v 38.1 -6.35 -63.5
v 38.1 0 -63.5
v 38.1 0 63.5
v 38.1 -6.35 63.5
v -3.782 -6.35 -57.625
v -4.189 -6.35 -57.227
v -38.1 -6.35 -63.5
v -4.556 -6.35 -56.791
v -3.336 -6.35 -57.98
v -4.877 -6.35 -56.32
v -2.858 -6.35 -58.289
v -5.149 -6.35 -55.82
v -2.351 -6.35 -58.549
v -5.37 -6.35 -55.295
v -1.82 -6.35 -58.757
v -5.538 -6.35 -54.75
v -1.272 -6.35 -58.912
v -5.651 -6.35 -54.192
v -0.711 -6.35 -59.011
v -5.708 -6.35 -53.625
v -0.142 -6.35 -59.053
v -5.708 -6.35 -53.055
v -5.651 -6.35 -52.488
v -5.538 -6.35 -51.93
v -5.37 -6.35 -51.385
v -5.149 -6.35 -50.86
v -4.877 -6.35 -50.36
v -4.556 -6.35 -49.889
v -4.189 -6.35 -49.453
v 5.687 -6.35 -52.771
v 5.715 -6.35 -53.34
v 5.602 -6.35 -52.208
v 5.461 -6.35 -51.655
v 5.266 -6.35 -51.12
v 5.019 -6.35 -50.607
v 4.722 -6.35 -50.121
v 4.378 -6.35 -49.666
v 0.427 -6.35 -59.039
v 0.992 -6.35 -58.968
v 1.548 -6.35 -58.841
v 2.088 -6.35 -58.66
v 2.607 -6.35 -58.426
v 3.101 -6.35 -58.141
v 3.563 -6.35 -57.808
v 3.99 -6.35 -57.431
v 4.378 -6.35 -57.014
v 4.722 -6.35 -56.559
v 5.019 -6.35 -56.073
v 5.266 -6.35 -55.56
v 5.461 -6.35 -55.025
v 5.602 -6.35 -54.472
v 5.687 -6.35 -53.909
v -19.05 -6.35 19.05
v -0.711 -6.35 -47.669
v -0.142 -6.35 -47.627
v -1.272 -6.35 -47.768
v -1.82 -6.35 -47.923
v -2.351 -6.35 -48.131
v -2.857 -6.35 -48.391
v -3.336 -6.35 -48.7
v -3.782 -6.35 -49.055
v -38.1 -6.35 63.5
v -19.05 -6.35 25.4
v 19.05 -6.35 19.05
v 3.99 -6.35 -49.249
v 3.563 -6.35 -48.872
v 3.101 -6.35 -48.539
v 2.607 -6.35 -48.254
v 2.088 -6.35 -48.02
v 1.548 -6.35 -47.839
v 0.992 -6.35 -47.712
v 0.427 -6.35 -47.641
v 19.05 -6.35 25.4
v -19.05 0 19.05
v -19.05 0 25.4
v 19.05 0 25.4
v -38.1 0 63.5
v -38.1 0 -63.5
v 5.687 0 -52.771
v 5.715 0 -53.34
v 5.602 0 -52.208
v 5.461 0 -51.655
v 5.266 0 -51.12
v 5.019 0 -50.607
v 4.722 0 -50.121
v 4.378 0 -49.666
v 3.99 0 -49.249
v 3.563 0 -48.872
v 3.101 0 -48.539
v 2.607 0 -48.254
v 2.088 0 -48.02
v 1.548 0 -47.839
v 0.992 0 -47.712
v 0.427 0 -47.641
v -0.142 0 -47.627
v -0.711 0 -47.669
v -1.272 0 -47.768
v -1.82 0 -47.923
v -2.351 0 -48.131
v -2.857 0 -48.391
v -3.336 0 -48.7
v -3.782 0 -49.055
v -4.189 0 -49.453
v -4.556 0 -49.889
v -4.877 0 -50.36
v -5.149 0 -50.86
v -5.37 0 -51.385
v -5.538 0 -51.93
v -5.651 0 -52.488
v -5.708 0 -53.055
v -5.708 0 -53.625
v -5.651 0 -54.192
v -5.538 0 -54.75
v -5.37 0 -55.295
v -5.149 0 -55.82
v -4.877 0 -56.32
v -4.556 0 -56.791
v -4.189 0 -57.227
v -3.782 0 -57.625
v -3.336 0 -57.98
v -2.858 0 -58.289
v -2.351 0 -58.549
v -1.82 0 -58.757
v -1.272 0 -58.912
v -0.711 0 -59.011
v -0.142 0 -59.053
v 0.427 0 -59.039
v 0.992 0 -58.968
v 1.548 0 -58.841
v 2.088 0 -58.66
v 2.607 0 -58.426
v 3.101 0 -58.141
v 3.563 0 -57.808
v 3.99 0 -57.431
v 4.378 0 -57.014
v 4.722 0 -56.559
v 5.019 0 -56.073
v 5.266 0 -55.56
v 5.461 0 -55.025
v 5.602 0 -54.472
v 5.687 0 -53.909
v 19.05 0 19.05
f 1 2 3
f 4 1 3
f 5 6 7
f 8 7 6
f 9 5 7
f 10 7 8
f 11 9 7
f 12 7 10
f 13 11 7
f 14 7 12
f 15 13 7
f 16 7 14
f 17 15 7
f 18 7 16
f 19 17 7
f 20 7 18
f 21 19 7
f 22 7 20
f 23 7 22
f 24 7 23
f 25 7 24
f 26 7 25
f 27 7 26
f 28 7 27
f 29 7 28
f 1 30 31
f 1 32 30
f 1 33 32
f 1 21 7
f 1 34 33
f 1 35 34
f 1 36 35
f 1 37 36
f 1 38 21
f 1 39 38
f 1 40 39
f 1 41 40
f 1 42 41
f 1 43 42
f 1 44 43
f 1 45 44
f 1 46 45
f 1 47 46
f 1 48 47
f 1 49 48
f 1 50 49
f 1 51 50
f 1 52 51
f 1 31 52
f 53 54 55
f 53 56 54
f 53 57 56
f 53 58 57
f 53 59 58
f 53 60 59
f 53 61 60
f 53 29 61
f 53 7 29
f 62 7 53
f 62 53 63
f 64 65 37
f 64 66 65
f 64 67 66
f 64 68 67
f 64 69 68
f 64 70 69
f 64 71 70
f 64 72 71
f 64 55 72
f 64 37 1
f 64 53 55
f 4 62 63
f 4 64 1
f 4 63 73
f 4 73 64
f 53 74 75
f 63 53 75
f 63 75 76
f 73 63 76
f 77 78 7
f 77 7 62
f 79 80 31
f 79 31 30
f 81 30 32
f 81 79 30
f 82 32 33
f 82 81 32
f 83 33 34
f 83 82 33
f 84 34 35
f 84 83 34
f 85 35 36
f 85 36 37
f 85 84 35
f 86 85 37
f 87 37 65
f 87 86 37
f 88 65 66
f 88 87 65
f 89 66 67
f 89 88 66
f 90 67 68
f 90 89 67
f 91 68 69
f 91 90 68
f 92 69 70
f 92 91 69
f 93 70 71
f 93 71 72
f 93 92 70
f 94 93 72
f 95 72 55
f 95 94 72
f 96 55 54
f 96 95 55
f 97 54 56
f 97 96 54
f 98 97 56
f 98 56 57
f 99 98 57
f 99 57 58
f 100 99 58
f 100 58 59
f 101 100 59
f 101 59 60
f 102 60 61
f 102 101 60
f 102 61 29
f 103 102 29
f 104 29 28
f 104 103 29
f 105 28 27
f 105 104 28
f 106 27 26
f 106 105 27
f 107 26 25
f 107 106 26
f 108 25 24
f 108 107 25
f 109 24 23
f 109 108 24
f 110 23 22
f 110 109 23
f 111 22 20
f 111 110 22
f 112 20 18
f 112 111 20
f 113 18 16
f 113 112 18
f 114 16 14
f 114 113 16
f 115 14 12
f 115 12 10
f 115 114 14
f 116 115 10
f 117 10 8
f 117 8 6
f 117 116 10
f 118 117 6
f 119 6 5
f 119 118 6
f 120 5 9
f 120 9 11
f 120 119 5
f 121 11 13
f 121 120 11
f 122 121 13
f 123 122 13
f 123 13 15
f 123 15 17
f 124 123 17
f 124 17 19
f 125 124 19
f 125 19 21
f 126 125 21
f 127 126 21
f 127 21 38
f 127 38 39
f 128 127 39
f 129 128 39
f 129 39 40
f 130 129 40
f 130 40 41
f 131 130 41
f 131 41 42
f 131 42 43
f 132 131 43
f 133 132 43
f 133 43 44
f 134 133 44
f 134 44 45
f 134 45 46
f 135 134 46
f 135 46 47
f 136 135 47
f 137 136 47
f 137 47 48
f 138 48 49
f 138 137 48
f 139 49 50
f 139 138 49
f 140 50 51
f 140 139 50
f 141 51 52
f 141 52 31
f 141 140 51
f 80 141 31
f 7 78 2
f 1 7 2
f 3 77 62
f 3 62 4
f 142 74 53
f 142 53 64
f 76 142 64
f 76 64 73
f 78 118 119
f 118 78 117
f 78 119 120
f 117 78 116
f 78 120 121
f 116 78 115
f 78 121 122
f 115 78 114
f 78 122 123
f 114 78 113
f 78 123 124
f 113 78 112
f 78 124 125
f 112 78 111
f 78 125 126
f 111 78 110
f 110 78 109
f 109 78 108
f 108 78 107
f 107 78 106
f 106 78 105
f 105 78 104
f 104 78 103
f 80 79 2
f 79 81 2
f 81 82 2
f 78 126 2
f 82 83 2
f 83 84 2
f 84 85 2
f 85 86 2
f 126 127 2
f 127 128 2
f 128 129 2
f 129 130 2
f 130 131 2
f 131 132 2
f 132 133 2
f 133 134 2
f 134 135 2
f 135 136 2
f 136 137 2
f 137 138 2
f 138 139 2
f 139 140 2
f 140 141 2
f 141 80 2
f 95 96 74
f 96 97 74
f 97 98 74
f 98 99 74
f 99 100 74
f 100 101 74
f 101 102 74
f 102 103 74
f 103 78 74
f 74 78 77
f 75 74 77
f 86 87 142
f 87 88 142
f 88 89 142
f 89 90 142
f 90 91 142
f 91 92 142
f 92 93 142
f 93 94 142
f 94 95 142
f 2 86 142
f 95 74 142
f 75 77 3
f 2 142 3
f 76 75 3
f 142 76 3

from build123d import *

# Parameters (mm, degrees)
F0_W     = 76.2
F0_H     = 127
F0_R     = 5.715
F0_W_2   = 38.1
F0_H_2   = 6.35
F1_DEPTH = 6.35


with BuildPart() as f1:
    # F0 (on Front) → F1 (new body)
    with BuildSketch(Plane.XZ):
        Rectangle(F0_W, F0_H)
        with Locations((0, -53.34)):
            Circle(F0_R, mode=Mode.SUBTRACT)
        with Locations((0, 22.225)):
            Rectangle(F0_W_2, F0_H_2, mode=Mode.SUBTRACT)
    extrude(amount=F1_DEPTH)


solid = f1.part
